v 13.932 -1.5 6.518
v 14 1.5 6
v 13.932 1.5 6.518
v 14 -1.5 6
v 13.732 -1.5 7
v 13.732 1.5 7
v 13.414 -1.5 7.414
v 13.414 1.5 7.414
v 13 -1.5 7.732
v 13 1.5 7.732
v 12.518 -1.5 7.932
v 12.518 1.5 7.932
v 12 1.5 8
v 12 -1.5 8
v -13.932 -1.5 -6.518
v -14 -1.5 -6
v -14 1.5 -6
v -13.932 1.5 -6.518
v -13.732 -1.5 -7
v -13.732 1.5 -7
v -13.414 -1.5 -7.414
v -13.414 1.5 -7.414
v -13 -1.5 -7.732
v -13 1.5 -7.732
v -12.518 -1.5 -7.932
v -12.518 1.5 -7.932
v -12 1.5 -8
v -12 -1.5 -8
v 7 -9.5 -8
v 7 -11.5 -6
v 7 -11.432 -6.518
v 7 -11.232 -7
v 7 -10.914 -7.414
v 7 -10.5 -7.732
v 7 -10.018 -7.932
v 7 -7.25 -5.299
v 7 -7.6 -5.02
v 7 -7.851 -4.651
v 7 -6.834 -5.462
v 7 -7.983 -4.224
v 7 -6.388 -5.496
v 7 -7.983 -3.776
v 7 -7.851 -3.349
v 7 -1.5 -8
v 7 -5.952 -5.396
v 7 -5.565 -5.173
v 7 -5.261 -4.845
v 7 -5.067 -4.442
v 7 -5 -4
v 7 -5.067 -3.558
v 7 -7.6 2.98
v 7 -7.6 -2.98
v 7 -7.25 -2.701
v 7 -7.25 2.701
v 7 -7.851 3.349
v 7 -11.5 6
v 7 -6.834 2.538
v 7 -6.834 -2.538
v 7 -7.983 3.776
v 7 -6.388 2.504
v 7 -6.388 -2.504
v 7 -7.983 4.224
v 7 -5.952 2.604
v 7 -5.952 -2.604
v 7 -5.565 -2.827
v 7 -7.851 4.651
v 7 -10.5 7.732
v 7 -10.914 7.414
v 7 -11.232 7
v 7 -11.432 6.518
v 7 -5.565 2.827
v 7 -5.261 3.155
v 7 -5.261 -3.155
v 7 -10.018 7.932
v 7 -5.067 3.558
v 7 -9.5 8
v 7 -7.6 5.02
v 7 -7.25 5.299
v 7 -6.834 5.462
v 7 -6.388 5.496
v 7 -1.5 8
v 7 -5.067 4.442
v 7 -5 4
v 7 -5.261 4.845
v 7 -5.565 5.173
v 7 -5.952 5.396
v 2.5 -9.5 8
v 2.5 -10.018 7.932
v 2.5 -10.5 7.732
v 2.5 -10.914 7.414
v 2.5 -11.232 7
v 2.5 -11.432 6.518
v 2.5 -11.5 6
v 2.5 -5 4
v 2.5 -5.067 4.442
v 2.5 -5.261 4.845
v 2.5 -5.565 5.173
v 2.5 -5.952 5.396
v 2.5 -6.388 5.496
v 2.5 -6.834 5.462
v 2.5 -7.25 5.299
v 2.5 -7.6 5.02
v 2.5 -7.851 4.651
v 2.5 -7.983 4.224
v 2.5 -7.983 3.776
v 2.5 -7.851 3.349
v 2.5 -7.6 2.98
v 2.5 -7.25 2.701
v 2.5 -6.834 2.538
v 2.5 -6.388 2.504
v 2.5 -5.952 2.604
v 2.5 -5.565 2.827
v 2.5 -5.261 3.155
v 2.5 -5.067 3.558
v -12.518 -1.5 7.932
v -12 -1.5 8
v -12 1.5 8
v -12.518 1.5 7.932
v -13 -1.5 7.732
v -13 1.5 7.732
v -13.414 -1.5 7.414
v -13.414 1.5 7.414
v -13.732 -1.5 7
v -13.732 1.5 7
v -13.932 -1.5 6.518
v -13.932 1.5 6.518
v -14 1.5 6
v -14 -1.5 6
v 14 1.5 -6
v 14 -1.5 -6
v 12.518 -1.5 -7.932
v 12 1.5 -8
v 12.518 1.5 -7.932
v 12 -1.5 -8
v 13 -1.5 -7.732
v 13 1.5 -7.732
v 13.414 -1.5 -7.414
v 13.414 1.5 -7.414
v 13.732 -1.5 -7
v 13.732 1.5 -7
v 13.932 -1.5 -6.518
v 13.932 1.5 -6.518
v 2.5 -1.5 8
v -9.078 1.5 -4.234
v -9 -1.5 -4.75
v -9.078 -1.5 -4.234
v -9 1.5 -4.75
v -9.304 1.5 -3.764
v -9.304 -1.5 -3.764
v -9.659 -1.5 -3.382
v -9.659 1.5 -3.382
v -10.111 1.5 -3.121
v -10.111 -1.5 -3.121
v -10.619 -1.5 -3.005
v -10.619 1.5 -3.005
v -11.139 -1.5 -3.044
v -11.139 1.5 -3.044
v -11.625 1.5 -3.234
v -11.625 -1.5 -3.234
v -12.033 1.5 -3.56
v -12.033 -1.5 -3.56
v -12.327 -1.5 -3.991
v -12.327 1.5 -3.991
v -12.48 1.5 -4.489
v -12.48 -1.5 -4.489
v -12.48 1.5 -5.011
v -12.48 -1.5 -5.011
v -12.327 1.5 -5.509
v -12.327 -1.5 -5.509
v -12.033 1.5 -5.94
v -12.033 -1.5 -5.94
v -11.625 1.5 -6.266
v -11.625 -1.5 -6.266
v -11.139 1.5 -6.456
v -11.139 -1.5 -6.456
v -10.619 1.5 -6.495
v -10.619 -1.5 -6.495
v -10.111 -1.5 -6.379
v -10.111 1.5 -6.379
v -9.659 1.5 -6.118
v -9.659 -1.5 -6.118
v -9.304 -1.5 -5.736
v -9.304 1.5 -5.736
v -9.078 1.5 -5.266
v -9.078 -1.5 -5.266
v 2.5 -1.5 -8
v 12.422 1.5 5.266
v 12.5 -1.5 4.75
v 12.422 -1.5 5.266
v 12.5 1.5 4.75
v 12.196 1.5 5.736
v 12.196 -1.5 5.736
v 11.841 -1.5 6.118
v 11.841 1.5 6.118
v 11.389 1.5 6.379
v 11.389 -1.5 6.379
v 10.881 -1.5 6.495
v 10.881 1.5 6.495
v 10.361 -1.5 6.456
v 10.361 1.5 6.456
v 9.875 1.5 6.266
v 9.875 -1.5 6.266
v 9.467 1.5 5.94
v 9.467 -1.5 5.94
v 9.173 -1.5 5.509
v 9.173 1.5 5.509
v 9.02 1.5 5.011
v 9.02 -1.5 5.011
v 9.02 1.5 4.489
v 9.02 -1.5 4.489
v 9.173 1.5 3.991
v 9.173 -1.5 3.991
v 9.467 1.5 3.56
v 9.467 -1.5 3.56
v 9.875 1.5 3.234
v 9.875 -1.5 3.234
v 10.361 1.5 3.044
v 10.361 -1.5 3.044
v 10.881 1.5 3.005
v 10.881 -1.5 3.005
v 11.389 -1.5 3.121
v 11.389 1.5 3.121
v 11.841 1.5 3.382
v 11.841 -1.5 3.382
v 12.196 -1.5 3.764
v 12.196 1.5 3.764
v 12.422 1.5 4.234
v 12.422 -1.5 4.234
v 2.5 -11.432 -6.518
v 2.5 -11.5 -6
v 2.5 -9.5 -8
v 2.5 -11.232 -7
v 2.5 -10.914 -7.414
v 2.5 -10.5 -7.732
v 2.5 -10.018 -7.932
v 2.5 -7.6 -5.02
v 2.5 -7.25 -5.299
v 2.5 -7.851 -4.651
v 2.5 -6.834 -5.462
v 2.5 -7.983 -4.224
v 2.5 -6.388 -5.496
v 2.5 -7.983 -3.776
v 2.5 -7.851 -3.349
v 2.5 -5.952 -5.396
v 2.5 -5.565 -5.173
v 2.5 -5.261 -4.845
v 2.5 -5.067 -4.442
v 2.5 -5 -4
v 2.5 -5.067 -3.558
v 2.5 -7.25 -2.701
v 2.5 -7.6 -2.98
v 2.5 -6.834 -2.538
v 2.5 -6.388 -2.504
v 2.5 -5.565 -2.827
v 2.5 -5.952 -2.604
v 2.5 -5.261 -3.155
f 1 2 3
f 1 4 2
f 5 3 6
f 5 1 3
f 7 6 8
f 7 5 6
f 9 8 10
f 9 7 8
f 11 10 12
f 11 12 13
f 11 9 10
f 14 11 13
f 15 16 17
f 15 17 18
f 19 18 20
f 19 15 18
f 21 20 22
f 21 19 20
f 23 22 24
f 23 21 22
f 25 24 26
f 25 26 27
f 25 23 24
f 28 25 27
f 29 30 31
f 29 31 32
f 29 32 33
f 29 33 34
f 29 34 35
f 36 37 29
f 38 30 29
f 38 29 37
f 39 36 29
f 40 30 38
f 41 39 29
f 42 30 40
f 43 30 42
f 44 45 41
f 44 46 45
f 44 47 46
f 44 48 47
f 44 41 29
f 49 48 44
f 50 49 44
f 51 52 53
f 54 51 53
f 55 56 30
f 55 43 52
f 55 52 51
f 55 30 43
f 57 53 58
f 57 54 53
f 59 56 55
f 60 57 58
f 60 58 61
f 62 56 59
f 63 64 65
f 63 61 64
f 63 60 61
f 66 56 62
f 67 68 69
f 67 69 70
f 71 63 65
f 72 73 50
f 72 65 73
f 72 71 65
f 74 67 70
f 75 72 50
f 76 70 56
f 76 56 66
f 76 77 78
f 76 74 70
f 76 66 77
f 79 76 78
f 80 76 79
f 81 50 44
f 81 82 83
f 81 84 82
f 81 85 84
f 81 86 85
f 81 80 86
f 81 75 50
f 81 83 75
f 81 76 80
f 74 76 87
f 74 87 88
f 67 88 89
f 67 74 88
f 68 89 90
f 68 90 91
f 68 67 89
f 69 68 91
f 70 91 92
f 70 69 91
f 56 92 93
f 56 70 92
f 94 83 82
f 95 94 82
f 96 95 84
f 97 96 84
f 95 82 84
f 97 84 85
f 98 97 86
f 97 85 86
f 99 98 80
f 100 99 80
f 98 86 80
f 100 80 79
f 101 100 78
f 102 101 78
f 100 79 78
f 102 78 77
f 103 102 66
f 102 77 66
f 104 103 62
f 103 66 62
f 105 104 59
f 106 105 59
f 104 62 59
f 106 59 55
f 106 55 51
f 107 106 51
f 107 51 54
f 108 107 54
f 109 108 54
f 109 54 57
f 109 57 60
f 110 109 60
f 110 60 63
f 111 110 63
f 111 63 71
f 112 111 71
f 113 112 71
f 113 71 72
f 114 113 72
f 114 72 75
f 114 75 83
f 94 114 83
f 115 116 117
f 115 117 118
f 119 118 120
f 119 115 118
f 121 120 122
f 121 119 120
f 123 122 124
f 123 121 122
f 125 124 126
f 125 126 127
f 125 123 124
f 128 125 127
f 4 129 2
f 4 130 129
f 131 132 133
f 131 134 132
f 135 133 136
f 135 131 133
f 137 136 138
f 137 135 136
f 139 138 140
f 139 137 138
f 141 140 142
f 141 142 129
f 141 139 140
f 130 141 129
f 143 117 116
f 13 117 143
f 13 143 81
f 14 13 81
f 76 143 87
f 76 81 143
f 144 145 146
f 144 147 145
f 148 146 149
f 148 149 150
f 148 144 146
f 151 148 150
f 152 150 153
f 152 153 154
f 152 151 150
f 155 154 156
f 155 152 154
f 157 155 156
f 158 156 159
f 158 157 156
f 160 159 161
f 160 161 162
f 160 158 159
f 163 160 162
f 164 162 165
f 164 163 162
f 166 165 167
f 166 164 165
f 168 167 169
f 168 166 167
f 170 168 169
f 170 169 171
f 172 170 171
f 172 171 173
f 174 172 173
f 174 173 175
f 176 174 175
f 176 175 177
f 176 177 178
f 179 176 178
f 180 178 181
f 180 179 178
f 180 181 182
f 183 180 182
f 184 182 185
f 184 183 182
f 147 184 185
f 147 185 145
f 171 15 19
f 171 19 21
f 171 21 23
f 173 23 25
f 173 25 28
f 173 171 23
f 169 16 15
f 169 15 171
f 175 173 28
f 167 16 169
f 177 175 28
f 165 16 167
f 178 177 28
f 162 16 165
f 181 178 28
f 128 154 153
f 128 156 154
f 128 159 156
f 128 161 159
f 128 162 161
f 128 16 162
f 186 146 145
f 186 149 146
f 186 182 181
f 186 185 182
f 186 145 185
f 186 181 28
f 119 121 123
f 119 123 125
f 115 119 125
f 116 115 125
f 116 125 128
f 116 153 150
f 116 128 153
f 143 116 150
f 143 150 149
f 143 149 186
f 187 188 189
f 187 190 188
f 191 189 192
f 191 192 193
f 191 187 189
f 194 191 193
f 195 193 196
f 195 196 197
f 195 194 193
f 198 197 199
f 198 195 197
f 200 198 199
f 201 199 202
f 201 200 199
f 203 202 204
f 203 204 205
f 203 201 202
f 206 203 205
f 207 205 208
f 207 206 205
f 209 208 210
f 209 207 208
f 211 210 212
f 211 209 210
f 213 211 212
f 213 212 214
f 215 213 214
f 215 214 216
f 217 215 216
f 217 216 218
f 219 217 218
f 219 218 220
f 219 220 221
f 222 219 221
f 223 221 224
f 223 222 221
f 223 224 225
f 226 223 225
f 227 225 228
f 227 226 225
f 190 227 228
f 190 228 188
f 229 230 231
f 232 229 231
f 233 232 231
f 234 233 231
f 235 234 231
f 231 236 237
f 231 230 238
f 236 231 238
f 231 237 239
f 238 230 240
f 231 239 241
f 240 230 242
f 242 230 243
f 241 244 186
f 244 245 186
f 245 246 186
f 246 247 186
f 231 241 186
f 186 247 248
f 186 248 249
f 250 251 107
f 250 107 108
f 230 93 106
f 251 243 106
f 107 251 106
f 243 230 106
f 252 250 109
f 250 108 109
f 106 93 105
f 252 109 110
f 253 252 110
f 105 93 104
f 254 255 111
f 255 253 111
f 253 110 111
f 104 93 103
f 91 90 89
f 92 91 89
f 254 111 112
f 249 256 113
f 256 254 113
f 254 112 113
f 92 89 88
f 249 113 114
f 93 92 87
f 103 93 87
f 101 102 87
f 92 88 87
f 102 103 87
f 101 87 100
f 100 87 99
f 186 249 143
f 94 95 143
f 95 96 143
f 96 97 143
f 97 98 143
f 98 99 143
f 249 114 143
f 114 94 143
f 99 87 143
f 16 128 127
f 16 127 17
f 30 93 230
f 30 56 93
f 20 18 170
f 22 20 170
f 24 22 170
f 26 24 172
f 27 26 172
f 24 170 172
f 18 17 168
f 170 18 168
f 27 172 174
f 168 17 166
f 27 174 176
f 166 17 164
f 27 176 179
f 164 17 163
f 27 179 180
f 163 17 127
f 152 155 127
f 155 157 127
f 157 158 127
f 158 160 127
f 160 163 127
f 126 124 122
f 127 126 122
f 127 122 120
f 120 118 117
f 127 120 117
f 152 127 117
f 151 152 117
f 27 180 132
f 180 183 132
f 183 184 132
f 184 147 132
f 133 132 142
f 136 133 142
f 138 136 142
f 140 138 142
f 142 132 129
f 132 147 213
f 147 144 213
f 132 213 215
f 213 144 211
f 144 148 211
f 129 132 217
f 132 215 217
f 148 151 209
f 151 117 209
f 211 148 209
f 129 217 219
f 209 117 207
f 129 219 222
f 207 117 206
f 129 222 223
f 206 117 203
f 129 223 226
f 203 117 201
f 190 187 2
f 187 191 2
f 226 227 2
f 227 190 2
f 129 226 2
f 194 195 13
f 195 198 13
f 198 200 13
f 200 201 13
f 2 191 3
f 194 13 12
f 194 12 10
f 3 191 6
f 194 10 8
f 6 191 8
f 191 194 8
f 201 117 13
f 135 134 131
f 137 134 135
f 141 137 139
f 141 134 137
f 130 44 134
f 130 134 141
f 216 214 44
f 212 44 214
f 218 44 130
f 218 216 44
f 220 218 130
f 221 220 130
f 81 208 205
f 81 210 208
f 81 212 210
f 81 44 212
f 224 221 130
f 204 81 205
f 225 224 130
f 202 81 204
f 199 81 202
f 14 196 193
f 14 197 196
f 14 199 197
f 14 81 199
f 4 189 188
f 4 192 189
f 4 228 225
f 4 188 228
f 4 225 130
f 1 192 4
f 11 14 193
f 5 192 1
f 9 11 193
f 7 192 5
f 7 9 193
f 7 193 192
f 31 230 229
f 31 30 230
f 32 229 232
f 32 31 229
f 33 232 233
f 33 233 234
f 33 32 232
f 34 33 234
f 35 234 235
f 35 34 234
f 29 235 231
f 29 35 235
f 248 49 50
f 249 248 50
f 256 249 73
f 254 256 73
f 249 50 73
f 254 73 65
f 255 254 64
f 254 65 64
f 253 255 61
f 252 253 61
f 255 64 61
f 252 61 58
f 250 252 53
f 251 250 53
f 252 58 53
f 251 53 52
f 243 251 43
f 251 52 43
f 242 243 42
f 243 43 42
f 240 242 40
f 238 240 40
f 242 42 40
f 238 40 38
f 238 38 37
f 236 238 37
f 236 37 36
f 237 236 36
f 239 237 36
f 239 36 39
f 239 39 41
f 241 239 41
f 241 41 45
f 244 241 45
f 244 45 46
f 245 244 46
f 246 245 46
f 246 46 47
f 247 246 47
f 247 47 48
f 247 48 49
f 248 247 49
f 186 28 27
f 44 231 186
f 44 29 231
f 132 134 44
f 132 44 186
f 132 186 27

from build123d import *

# Parameters (mm, degrees)
F0_R     = 1.75
F1_DEPTH = 1.5
F4_DEPTH = 3
F5_DEPTH = 1.5
F6_R     = 1.5
F7_DEPTH = 21.001


with BuildPart() as f1:
    # F0 (on Front) → F1 (new body, symmetric)
    with BuildSketch(Plane.XZ):
        with BuildLine():
            ThreePointArc((14, 6), (13.4142135624, 7.4142135624), (12, 8))
            Line((12, 8), (-12, 8))
            ThreePointArc((-12, 8), (-13.4142135624, 7.4142135624), (-14, 6))
            Line((-14, 6), (-14, -6))
            ThreePointArc((-14, -6), (-13.4142135624, -7.4142135624), (-12, -8))
            Line((-12, -8), (12, -8))
            ThreePointArc((12, -8), (13.4142135624, -7.4142135624), (14, -6))
            Line((14, -6), (14, 6))
        make_face()
        with Locations((-10.75, -4.75)):
            Circle(F0_R, mode=Mode.SUBTRACT)
        with Locations((10.75, 4.75)):
            Circle(F0_R, mode=Mode.SUBTRACT)
    extrude(amount=F1_DEPTH, both=True)

    # F3 (on offset) → F4 (join)
    with BuildSketch(Plane.YZ.offset(4)):
        with BuildLine():
            Line((-9.5, -8), (-1.5, -8))
            Line((-1.5, -8), (-1.5, 8))
            Line((-1.5, 8), (-9.5, 8))
            ThreePointArc((-9.5, 8), (-10.9142135624, 7.4142135624), (-11.5, 6))
            Line((-11.5, 6), (-11.5, -6))
            ThreePointArc((-11.5, -6), (-10.9142135624, -7.4142135624), (-9.5, -8))
        make_face()
    extrude(amount=F4_DEPTH)

    # F3 (on offset) → F5 (join, symmetric)
    with BuildSketch(Plane.YZ.offset(4)):
        with BuildLine():
            Line((-9.5, -8), (-1.5, -8))
            Line((-1.5, -8), (-1.5, 8))
            Line((-1.5, 8), (-9.5, 8))
            ThreePointArc((-9.5, 8), (-10.9142135624, 7.4142135624), (-11.5, 6))
            Line((-11.5, 6), (-11.5, -6))
            ThreePointArc((-11.5, -6), (-10.9142135624, -7.4142135624), (-9.5, -8))
        make_face()
    extrude(amount=F5_DEPTH, both=True)

    # F6 (on face) → F7 (cut, through all)
    with BuildSketch(Plane.YZ.offset(7)):
        with Locations((-6.5, 4)):
            Circle(F6_R)
        with Locations((-6.5, -4)):
            Circle(F6_R)
    extrude(amount=-F7_DEPTH, mode=Mode.SUBTRACT)


solid = f1.part
